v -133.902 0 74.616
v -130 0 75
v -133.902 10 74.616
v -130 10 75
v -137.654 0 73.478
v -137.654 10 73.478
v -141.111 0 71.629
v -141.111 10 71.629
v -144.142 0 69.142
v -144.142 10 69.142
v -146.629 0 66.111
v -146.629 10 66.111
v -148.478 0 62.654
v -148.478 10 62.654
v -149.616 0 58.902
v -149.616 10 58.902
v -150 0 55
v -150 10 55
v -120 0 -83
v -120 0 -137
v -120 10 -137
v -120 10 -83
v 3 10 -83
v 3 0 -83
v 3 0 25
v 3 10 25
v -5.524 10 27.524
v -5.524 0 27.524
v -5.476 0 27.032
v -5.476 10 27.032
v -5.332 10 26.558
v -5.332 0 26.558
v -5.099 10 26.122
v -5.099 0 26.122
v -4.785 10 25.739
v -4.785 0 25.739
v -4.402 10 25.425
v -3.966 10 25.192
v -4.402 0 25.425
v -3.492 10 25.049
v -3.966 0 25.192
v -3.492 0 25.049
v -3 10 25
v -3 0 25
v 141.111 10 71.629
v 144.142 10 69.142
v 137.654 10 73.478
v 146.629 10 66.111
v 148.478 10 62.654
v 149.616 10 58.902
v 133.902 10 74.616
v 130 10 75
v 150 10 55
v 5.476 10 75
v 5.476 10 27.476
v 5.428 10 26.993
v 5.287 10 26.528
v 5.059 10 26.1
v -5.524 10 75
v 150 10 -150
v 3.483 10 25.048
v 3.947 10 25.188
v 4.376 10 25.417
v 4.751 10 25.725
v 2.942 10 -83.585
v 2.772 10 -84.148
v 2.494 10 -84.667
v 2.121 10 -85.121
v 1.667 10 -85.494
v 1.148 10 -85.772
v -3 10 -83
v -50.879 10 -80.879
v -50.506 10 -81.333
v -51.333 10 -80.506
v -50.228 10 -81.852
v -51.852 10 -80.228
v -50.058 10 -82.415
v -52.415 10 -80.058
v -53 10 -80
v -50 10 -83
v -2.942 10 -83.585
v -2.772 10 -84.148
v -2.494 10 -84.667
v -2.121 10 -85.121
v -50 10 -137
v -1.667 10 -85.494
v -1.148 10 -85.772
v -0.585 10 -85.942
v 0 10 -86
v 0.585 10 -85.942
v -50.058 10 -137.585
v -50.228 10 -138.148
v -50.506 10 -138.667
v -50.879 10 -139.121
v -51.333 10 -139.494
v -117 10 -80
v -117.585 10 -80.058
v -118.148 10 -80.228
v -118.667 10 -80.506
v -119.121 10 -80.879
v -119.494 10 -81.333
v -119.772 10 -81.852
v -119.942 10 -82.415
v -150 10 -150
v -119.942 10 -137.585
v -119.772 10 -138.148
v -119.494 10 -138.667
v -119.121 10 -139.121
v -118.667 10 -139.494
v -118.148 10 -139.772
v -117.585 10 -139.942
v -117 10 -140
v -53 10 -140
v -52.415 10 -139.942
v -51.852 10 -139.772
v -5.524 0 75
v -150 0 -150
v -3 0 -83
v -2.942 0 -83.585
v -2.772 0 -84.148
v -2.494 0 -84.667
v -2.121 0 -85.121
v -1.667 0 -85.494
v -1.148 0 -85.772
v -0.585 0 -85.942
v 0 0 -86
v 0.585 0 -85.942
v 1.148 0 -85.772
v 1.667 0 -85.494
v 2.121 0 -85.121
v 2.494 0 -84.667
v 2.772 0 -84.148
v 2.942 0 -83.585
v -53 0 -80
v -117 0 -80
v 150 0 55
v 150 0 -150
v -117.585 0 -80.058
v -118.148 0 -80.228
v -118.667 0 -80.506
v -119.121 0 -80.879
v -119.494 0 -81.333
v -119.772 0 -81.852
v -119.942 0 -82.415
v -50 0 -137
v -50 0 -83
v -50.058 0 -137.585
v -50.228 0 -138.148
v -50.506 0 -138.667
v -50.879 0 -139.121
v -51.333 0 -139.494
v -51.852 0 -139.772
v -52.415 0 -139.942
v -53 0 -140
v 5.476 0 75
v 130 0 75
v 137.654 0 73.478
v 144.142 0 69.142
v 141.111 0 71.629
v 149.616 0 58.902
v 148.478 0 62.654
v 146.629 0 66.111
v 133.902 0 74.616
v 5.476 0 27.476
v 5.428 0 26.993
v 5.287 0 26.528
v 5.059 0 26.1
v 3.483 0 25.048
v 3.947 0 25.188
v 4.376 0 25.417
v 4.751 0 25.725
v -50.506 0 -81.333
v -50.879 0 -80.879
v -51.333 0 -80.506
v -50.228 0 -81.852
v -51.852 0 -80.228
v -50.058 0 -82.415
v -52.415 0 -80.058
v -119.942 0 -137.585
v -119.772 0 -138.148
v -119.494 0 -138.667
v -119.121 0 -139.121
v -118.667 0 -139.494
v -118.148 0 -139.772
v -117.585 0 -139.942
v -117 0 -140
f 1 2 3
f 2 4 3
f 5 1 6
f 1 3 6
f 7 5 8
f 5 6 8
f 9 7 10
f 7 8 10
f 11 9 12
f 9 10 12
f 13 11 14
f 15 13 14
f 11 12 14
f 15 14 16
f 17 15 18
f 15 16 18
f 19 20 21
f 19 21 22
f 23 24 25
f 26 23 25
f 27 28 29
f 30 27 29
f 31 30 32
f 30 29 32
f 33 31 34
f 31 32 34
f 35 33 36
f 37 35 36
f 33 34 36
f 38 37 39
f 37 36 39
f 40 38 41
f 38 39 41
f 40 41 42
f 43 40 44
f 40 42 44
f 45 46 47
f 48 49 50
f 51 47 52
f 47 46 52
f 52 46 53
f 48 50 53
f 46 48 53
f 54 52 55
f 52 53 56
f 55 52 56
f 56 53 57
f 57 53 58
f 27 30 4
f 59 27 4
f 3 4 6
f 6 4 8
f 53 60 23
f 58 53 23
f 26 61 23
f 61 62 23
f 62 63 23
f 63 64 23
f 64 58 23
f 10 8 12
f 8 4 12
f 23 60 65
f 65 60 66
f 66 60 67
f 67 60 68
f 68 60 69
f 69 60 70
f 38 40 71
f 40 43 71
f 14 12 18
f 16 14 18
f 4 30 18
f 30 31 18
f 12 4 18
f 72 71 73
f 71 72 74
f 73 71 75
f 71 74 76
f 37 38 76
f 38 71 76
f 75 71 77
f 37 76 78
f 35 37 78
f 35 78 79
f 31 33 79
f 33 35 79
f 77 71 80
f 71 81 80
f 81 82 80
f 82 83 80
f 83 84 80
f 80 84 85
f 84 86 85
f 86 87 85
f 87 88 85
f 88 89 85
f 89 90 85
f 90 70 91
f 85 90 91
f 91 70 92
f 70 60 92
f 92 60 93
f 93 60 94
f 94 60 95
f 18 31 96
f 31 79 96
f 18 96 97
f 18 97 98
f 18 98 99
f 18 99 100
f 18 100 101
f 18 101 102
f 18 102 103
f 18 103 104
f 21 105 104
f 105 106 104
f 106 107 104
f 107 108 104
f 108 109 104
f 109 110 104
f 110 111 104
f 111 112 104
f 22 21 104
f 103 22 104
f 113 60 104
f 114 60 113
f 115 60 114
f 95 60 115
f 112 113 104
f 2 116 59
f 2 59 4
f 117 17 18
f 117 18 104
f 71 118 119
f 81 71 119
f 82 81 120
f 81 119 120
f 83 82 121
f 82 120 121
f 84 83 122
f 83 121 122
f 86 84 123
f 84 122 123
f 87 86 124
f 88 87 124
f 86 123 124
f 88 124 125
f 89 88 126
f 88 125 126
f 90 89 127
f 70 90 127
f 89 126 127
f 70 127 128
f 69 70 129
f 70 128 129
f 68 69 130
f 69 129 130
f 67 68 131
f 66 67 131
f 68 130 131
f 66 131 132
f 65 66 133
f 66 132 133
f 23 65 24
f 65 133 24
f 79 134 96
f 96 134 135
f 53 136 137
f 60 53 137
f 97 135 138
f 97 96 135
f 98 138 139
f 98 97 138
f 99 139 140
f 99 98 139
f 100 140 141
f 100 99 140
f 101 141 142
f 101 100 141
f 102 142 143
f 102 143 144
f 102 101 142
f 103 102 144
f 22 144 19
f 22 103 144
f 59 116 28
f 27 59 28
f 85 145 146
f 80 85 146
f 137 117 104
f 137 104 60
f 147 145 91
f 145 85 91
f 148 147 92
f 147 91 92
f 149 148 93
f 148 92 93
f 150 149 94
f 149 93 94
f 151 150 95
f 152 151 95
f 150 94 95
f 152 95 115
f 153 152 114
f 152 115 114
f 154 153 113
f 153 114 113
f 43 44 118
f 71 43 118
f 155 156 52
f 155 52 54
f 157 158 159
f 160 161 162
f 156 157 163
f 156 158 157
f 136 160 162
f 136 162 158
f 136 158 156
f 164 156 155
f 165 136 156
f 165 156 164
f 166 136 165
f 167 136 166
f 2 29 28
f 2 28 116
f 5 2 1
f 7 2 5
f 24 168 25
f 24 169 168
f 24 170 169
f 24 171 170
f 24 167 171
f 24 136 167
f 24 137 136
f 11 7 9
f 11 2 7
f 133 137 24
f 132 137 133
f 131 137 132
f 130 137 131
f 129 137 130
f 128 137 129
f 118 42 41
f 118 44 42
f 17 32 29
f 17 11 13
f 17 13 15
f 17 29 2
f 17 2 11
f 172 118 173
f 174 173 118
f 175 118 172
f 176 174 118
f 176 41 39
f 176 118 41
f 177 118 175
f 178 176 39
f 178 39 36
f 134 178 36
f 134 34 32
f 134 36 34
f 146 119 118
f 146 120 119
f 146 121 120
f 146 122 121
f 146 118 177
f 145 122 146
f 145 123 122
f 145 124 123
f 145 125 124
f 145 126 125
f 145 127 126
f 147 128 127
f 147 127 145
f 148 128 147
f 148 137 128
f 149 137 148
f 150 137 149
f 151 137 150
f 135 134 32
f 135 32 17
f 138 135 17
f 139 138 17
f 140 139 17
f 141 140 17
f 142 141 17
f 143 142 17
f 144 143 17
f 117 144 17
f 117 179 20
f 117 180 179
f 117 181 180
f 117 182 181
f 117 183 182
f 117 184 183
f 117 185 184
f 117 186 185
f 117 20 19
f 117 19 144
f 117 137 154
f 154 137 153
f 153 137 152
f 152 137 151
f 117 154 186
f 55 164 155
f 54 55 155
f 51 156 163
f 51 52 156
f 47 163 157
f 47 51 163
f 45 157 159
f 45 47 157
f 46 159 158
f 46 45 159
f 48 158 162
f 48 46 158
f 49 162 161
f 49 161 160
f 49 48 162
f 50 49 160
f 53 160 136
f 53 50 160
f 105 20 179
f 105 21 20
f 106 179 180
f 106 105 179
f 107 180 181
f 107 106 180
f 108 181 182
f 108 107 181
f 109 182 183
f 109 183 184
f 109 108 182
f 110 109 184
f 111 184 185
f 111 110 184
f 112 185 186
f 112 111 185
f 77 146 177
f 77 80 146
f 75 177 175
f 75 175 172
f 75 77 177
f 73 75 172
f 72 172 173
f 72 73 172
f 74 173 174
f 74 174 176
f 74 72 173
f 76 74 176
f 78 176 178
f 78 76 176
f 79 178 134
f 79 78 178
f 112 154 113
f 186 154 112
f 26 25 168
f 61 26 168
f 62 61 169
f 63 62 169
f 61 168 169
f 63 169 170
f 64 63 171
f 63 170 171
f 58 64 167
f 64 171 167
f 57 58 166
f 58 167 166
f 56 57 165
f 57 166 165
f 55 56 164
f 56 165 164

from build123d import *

# Parameters (mm, degrees)
LINEAR_AUSTRAGEN1_DEPTH         = 10
VERRUNDUNG1_R                   = 20
VERRUNDUNG1_OF_SPIEGELN2_R      = 20
SKIZZE3_W                       = 70
SKIZZE3_H                       = 60
SCHNITT_LINEAR_AUSTRAGEN1_DEPTH = 11
VERRUNDUNG2_R                   = 3
SCHNITT_LINEAR_AUSTRAGEN2_DEPTH = 10


with BuildPart() as part:
    # Skizze1 → Linear austragen1 (new body)
    with BuildSketch(Plane(origin=(0, 0, 0), x_dir=(1, 0, 0), z_dir=(0, 1, 0))):
        Polygon((150, 75), (150, 150), (0, 150), (0, 75), (0, -75), (150, -75), align=None)
    linear_austragen1 = extrude(amount=LINEAR_AUSTRAGEN1_DEPTH)

    # Verrundung1
    verrundung1_edges = [part.edges().sort_by_distance(p)[0] for p in [
        (150, 5, 75),
    ]]
    fillet(verrundung1_edges, radius=VERRUNDUNG1_R)

    # Spiegeln2: Linear austragen1 across plane
    add(linear_austragen1.mirror(Plane(origin=(0, 10, -150), x_dir=(0, 0, 1), z_dir=(1, 0, 0))))

    # Verrundung1 of Spiegeln2
    verrundung1_of_spiegeln2_edges = [part.edges().sort_by_distance(p)[0] for p in [
        (-150, 5, 75),
    ]]
    fillet(verrundung1_of_spiegeln2_edges, radius=VERRUNDUNG1_OF_SPIEGELN2_R)

    # Skizze3 → Schnitt-Linear austragen1 (cut, through all)
    with BuildSketch(Plane(origin=(0, 0, 0), x_dir=(-1, 0, 0), z_dir=(0, 1, 0))):
        with Locations((85, -110)):
            Rectangle(SKIZZE3_W, SKIZZE3_H)
    extrude(amount=SCHNITT_LINEAR_AUSTRAGEN1_DEPTH, mode=Mode.SUBTRACT)

    # Verrundung2
    verrundung2_edges = [part.edges().sort_by_distance(p)[0] for p in [
        (-120, 5, -140),
        (-120, 5, -80),
        (-50, 5, -80),
        (-50, 5, -140),
    ]]
    fillet(verrundung2_edges, radius=VERRUNDUNG2_R)

    # Skizze4 → Schnitt-Linear austragen2 (cut)
    with BuildSketch(Plane.XZ):
        with BuildLine():
            Line((-3, 25), (-3, -83))
            ThreePointArc((-3, -83), (0, -86), (3, -83))
            Line((3, -83), (3, 25))
            ThreePointArc((3, 25), (4.75069059, 25.725159786), (5.475850376, 27.475850376))
            Line((5.475850376, 27.475850376), (5.475850376, 75))
            Line((5.475850376, 75), (-5.524149624, 75))
            Line((-5.524149624, 75), (-5.524149624, 27.524149624))
            ThreePointArc((-5.524149624, 27.524149624), (-4.784843316, 25.739306308), (-3, 25))
        make_face()
    extrude(amount=-SCHNITT_LINEAR_AUSTRAGEN2_DEPTH, mode=Mode.SUBTRACT)


solid = part.part
